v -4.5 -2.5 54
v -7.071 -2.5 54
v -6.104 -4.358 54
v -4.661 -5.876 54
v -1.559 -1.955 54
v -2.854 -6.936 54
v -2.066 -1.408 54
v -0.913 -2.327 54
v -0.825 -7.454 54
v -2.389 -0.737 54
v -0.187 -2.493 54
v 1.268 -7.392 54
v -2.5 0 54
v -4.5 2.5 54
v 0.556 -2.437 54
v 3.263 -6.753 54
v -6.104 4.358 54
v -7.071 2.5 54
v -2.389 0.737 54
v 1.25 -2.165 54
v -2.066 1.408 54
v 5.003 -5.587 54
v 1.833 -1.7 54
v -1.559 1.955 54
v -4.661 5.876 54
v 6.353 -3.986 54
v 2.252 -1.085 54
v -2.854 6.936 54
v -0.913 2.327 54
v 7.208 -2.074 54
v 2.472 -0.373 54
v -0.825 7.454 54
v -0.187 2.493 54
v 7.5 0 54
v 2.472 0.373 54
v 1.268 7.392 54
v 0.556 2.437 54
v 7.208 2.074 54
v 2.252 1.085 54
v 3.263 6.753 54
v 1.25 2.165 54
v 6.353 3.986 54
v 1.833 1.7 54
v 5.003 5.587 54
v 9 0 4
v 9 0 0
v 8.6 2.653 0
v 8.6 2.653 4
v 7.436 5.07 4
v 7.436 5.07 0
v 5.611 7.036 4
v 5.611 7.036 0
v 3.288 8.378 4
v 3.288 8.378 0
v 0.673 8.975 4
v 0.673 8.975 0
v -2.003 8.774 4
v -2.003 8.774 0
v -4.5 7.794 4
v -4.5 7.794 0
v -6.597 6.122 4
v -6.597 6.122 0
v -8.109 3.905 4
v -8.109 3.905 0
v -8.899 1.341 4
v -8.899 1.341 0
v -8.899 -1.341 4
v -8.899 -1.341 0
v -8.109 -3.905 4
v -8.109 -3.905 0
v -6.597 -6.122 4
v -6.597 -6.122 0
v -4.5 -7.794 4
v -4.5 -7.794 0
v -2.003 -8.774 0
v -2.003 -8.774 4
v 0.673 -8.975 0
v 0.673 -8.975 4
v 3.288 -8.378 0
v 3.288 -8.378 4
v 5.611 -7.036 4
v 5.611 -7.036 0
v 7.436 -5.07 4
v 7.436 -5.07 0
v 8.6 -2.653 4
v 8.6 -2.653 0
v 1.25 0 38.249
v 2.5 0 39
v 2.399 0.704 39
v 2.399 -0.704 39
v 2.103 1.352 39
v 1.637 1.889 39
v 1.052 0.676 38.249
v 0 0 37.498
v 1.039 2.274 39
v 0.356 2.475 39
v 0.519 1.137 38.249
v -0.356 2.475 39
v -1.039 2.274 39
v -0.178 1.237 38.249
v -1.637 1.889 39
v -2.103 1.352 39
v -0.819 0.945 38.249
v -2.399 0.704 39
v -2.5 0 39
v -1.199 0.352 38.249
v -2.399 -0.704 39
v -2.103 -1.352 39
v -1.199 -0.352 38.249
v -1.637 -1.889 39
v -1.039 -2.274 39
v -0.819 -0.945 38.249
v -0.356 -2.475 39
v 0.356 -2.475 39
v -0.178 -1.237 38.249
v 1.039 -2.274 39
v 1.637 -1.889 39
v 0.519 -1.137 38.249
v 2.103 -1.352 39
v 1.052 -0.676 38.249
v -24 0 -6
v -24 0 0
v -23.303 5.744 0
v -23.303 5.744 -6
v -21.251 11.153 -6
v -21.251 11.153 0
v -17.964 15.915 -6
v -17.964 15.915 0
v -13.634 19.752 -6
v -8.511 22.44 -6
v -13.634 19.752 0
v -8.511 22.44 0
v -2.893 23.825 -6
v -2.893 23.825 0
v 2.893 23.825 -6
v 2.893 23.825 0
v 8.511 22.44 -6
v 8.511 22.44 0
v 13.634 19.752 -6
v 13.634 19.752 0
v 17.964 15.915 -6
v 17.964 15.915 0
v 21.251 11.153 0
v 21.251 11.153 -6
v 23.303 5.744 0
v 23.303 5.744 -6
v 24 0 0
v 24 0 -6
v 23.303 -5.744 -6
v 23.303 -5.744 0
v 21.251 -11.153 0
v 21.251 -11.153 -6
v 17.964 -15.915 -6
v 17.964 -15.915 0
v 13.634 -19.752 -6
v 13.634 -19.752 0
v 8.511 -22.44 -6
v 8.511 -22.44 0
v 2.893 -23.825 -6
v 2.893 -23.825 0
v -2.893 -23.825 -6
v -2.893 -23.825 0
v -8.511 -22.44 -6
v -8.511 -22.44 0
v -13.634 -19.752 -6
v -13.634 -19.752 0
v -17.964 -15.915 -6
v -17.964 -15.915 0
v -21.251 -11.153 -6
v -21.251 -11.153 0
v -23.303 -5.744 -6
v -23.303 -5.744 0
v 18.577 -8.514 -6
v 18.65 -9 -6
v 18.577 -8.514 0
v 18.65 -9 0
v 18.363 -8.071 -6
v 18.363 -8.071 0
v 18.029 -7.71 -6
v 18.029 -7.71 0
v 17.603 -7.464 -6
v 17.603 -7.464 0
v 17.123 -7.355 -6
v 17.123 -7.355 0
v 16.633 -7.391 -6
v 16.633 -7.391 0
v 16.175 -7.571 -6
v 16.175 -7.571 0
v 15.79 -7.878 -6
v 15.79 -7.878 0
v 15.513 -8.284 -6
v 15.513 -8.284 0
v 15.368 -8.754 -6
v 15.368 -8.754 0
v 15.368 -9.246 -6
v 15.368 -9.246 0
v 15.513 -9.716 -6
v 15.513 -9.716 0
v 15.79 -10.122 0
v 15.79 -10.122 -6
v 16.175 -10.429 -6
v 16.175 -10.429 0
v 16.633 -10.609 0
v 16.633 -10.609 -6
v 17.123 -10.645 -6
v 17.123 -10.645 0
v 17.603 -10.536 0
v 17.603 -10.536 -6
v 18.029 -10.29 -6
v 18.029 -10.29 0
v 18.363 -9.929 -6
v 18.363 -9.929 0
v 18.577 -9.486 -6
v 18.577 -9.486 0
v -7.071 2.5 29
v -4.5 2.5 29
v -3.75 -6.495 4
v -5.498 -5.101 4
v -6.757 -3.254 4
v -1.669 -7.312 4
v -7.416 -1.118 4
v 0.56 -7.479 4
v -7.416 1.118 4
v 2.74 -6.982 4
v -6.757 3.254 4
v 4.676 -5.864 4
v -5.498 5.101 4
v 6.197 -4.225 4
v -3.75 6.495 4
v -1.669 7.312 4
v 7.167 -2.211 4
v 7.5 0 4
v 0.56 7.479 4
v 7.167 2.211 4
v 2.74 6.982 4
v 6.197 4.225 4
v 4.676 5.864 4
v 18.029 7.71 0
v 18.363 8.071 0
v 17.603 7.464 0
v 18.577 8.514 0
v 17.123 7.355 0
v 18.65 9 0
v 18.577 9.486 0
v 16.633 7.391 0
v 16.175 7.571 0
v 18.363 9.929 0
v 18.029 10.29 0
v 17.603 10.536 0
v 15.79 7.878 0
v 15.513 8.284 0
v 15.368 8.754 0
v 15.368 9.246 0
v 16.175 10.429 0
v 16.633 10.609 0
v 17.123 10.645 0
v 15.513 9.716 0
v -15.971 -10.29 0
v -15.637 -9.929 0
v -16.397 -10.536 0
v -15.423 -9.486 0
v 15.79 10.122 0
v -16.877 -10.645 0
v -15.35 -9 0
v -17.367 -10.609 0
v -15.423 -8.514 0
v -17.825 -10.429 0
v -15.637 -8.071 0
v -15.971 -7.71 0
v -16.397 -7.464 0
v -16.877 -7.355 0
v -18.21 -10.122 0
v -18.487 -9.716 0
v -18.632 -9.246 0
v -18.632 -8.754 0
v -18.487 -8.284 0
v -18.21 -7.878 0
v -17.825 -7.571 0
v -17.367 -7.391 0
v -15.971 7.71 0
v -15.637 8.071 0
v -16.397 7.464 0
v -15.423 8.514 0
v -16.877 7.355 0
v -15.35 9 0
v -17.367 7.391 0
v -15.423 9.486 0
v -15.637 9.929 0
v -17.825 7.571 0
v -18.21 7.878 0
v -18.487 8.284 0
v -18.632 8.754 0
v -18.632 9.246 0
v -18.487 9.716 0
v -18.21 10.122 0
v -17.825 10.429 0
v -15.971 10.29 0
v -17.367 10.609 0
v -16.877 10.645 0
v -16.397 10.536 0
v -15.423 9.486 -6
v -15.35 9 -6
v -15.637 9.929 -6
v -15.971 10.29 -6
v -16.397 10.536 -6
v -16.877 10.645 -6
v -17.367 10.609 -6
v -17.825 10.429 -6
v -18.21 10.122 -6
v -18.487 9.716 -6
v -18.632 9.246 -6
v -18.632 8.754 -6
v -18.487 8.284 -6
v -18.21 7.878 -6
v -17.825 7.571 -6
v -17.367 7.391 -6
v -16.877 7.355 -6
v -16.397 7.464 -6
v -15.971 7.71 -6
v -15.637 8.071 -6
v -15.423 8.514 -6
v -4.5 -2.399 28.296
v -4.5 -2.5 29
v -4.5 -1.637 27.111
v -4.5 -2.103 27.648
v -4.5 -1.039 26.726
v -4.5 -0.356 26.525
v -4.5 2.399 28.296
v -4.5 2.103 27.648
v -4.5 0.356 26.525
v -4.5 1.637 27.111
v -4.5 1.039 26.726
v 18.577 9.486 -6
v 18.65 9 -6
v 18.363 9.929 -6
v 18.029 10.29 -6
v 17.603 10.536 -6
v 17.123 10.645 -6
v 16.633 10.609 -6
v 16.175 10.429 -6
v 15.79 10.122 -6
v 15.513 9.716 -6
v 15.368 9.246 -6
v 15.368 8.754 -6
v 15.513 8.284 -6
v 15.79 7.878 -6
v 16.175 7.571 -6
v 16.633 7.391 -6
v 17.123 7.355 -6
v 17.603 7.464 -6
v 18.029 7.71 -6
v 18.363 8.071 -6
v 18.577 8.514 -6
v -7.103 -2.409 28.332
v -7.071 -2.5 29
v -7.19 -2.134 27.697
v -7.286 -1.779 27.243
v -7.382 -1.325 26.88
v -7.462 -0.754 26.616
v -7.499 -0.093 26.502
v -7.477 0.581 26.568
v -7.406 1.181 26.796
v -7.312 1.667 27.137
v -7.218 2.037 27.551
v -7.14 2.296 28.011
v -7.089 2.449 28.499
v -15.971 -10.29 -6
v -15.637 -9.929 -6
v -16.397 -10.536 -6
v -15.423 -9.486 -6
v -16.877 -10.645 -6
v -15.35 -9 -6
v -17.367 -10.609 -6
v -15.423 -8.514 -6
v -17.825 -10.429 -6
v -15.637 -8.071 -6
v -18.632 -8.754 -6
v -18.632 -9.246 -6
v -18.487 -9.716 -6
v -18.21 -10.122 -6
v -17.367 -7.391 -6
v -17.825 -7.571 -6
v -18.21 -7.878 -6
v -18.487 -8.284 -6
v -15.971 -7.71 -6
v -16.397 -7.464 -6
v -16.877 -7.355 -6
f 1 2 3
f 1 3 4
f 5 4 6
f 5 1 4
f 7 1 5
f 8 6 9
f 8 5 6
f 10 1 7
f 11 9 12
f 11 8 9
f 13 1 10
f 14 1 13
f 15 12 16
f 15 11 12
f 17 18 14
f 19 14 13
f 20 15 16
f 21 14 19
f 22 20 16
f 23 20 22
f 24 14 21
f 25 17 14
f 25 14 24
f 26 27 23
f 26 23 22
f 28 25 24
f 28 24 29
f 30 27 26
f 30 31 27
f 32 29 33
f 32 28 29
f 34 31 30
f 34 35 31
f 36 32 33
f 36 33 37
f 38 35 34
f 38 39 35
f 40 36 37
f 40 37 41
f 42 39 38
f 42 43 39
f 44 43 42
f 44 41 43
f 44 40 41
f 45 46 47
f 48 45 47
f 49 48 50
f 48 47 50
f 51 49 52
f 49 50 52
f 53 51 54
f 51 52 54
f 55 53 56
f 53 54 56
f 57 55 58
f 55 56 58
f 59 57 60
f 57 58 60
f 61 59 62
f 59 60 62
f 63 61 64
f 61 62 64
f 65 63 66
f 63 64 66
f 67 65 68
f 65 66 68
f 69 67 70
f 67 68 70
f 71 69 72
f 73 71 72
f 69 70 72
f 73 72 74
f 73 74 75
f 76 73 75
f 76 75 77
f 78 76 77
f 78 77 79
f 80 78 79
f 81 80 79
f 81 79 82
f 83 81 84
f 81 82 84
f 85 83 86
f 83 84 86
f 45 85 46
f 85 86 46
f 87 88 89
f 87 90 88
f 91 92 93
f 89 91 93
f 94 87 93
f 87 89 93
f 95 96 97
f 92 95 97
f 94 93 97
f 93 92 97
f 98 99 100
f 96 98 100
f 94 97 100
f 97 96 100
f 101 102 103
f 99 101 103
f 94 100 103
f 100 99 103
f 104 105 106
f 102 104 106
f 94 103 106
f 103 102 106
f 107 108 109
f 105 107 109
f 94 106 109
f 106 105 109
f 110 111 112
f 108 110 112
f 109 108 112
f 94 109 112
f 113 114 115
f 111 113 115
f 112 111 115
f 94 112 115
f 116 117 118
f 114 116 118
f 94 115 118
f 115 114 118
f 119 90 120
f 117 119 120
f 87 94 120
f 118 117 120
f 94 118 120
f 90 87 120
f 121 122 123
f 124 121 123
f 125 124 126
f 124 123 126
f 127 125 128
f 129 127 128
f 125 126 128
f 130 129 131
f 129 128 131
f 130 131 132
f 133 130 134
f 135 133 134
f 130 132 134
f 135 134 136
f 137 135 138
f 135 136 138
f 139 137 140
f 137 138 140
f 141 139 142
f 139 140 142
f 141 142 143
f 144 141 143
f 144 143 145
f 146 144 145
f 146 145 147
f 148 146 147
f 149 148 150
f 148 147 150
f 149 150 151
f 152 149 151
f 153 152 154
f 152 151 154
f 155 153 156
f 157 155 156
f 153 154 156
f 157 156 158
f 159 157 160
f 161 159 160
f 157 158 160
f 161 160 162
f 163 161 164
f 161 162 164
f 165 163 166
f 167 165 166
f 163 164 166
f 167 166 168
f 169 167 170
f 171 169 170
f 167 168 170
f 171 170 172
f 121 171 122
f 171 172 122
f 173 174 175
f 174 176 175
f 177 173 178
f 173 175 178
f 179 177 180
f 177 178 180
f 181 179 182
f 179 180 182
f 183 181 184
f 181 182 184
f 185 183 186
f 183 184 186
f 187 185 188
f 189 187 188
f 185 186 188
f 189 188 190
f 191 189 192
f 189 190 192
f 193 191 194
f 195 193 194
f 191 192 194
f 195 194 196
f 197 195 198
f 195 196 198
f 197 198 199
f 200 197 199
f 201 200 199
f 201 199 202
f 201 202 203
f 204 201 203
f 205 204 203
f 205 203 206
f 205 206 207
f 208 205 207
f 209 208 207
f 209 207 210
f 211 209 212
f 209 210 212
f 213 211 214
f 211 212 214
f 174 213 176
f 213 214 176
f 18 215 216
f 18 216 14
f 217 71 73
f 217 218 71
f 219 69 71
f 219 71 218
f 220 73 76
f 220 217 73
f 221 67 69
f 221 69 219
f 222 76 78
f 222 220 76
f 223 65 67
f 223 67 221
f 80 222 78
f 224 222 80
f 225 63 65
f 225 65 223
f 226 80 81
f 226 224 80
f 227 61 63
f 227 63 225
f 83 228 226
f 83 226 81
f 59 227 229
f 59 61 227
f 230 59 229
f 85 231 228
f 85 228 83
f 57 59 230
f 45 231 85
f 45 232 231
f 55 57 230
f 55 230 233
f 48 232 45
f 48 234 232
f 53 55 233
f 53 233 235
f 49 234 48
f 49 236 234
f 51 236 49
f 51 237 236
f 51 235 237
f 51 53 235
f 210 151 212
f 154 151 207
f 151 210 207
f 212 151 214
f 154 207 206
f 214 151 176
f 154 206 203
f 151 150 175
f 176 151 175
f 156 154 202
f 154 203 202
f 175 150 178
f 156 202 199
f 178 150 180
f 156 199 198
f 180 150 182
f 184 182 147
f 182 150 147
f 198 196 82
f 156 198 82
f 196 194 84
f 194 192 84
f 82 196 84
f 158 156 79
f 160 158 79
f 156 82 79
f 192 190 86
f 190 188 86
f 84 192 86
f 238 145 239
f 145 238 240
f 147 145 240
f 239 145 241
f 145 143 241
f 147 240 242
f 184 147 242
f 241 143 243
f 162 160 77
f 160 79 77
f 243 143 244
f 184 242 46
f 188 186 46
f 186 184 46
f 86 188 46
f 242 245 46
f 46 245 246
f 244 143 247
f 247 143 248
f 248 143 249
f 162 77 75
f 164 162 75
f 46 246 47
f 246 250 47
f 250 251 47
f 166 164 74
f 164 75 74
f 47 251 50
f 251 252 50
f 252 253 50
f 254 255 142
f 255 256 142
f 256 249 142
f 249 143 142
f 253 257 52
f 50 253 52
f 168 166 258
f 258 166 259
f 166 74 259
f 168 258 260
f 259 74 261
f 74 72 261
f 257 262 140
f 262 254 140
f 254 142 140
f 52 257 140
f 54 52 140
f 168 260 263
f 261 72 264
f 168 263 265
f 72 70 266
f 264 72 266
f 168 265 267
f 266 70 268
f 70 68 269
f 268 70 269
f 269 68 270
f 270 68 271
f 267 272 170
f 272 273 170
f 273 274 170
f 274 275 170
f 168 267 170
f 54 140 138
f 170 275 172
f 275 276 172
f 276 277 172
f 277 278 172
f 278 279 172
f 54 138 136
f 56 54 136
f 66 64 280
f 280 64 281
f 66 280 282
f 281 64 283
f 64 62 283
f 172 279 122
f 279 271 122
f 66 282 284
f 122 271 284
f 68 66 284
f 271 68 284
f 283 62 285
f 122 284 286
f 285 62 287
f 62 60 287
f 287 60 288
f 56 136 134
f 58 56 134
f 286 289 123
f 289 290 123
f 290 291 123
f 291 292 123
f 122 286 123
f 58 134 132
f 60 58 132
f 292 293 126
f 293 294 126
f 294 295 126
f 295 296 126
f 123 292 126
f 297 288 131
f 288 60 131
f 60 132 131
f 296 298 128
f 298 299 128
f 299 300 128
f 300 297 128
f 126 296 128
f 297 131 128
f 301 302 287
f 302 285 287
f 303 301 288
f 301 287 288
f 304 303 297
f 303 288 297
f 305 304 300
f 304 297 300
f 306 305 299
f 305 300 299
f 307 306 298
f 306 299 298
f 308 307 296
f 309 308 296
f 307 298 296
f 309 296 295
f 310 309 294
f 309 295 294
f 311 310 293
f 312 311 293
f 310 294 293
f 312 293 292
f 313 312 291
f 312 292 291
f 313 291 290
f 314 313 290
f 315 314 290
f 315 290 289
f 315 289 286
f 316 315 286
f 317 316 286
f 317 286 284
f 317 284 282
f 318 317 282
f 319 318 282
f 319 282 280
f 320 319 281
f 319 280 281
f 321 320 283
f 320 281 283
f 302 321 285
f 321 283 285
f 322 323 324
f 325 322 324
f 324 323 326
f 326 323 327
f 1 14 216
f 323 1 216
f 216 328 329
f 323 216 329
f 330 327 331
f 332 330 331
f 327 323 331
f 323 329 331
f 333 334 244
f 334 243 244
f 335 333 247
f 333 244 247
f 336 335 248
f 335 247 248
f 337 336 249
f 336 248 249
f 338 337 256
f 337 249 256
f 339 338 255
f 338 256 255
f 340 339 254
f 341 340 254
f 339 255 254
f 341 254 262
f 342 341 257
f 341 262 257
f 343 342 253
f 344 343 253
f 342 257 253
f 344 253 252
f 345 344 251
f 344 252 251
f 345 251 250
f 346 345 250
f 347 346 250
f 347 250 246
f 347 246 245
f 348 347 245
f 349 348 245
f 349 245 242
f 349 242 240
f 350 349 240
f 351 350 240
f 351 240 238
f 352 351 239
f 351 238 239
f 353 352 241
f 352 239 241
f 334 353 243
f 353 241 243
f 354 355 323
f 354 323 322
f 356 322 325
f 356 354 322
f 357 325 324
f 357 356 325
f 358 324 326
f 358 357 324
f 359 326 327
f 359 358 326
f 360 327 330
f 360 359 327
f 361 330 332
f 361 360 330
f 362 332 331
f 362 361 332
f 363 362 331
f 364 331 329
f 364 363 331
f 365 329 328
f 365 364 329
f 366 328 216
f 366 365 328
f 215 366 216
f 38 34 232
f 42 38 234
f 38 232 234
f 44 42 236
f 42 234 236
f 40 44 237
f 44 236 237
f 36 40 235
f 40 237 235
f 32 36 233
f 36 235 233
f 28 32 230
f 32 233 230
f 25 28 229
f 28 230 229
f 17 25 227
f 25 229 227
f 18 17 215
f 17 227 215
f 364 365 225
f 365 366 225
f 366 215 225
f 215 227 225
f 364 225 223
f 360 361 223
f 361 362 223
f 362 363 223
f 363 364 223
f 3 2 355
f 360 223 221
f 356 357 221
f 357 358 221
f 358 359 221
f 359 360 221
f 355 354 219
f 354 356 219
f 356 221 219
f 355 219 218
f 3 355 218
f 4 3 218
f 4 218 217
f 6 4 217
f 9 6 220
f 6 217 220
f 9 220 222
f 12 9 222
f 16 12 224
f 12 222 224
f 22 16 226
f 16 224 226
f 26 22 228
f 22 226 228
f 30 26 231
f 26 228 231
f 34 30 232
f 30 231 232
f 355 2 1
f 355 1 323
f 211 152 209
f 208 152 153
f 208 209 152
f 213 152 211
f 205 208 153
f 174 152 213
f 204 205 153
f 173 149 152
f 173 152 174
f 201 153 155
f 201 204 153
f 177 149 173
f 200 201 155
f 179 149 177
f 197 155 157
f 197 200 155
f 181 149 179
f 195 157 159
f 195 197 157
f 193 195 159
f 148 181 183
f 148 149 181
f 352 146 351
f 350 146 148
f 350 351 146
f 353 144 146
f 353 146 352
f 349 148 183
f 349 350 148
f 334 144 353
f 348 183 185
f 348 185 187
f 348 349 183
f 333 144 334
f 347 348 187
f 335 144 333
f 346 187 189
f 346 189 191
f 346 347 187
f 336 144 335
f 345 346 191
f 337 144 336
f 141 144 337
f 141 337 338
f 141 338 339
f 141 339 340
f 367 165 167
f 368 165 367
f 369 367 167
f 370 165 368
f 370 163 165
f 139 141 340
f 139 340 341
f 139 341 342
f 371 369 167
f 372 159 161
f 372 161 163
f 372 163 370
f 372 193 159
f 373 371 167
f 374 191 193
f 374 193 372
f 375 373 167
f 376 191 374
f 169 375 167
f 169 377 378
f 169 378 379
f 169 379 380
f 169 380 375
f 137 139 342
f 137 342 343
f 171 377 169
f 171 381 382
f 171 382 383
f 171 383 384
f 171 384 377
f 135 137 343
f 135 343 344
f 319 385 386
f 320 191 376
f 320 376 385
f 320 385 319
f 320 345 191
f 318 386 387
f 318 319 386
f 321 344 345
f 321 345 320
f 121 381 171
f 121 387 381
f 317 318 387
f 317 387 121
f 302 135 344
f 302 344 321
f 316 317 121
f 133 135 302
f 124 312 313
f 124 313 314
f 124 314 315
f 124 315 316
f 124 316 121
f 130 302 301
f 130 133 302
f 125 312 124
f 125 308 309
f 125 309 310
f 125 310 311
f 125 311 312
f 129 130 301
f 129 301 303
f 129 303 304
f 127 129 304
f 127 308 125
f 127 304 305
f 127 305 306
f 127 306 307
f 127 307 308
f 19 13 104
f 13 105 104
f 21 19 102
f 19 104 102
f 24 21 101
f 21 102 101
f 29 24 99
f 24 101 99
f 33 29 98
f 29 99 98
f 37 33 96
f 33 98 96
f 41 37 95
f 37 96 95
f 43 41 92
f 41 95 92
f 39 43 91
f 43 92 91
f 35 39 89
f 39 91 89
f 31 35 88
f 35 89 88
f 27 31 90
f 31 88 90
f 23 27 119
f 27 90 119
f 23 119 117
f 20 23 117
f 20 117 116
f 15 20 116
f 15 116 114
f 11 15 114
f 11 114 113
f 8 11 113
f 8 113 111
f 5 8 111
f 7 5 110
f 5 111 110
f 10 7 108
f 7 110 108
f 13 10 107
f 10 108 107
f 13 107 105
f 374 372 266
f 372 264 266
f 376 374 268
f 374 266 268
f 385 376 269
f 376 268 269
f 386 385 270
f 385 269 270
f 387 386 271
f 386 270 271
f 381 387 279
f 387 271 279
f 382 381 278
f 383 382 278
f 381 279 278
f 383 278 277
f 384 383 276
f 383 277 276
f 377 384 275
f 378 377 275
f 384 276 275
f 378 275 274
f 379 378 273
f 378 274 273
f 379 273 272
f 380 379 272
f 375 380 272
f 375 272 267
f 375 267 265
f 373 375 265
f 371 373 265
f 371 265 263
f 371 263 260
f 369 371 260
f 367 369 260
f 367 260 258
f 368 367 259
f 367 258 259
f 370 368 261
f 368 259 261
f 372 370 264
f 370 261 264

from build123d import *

# Parameters (mm, degrees)
ESQUISSE1_R                                   = 9
BOSS_EXTRU_1_DEPTH                            = 4
ESQUISSE2_R                                   = 24
BOSS_EXTRU_2_DEPTH                            = 6
ESQUISSE7_R                                   = 7.5
BOSS_EXTRU_3_DEPTH                            = 50
TROU_POUR_TARAUDAGE_POUR_TROU_TARAUD_M4_D     = 3.3
TROU_POUR_TARAUDAGE_POUR_TROU_TARAUD_M4_DEPTH = 6
TROU_POUR_TARAUDAGE_POUR_TROU_TARAUD_M4_TIP   = 0.991420021
ENL_V_MAT_EXTRU_1_DEPTH                       = 3
TROU_POUR_TARAUDAGE_POUR_TROU_TARAUD_M6_D     = 5
TROU_POUR_TARAUDAGE_POUR_TROU_TARAUD_M6_DEPTH = 15
TROU_POUR_TARAUDAGE_POUR_TROU_TARAUD_M6_TIP   = 1.502151548


with BuildPart() as part:
    # Esquisse1 → Boss.-Extru.1 (new body)
    with BuildSketch(Plane.XY):
        Circle(ESQUISSE1_R)
    extrude(amount=BOSS_EXTRU_1_DEPTH)

    # Esquisse2 → Boss.-Extru.2 (add)
    with BuildSketch(Plane(origin=(0, 0, 0), x_dir=(-1, 0, 0), z_dir=(0, 0, -1))):
        Circle(ESQUISSE2_R)
    extrude(amount=BOSS_EXTRU_2_DEPTH)

    # Esquisse7 → Boss.-Extru.3 (add)
    with BuildSketch(Plane.XY.offset(4)):
        Circle(ESQUISSE7_R)
    extrude(amount=BOSS_EXTRU_3_DEPTH)

    # Trou pour taraudage pour trou taraudé M42
    with Locations(Plane(origin=(0, 0, -6), x_dir=(-1, 0, 0), z_dir=(0, 0, -1))):
        with Locations((-17, 9), (17, -9), (17, 9), (-17, -9)):
            Hole(TROU_POUR_TARAUDAGE_POUR_TROU_TARAUD_M4_D / 2, depth=TROU_POUR_TARAUDAGE_POUR_TROU_TARAUD_M4_DEPTH)
            with Locations((0, 0, -(TROU_POUR_TARAUDAGE_POUR_TROU_TARAUD_M4_DEPTH + TROU_POUR_TARAUDAGE_POUR_TROU_TARAUD_M4_TIP / 2))):  # 118° drill point
                Cone(0, TROU_POUR_TARAUDAGE_POUR_TROU_TARAUD_M4_D / 2, TROU_POUR_TARAUDAGE_POUR_TROU_TARAUD_M4_TIP, mode=Mode.SUBTRACT)

    # Esquisse10 → Enlèv. mat.-Extru.1 (cut)
    with BuildSketch(Plane.ZY.offset(7.5)):
        with BuildLine():
            Line((79, -2.5), (29, -2.5))
            ThreePointArc((29, -2.5), (26.5, 0), (29, 2.5))
            Line((29, 2.5), (79, 2.5))
            ThreePointArc((79, 2.5), (81.5, 0), (79, -2.5))
        make_face()
    extrude(amount=-ENL_V_MAT_EXTRU_1_DEPTH, mode=Mode.SUBTRACT)

    # Trou pour taraudage pour trou taraudé M61
    with Locations(Plane.XY.offset(54)):
        with Locations((0, 0)):
            Hole(TROU_POUR_TARAUDAGE_POUR_TROU_TARAUD_M6_D / 2, depth=TROU_POUR_TARAUDAGE_POUR_TROU_TARAUD_M6_DEPTH)
            with Locations((0, 0, -(TROU_POUR_TARAUDAGE_POUR_TROU_TARAUD_M6_DEPTH + TROU_POUR_TARAUDAGE_POUR_TROU_TARAUD_M6_TIP / 2))):  # 118° drill point
                Cone(0, TROU_POUR_TARAUDAGE_POUR_TROU_TARAUD_M6_D / 2, TROU_POUR_TARAUDAGE_POUR_TROU_TARAUD_M6_TIP, mode=Mode.SUBTRACT)


solid = part.part
